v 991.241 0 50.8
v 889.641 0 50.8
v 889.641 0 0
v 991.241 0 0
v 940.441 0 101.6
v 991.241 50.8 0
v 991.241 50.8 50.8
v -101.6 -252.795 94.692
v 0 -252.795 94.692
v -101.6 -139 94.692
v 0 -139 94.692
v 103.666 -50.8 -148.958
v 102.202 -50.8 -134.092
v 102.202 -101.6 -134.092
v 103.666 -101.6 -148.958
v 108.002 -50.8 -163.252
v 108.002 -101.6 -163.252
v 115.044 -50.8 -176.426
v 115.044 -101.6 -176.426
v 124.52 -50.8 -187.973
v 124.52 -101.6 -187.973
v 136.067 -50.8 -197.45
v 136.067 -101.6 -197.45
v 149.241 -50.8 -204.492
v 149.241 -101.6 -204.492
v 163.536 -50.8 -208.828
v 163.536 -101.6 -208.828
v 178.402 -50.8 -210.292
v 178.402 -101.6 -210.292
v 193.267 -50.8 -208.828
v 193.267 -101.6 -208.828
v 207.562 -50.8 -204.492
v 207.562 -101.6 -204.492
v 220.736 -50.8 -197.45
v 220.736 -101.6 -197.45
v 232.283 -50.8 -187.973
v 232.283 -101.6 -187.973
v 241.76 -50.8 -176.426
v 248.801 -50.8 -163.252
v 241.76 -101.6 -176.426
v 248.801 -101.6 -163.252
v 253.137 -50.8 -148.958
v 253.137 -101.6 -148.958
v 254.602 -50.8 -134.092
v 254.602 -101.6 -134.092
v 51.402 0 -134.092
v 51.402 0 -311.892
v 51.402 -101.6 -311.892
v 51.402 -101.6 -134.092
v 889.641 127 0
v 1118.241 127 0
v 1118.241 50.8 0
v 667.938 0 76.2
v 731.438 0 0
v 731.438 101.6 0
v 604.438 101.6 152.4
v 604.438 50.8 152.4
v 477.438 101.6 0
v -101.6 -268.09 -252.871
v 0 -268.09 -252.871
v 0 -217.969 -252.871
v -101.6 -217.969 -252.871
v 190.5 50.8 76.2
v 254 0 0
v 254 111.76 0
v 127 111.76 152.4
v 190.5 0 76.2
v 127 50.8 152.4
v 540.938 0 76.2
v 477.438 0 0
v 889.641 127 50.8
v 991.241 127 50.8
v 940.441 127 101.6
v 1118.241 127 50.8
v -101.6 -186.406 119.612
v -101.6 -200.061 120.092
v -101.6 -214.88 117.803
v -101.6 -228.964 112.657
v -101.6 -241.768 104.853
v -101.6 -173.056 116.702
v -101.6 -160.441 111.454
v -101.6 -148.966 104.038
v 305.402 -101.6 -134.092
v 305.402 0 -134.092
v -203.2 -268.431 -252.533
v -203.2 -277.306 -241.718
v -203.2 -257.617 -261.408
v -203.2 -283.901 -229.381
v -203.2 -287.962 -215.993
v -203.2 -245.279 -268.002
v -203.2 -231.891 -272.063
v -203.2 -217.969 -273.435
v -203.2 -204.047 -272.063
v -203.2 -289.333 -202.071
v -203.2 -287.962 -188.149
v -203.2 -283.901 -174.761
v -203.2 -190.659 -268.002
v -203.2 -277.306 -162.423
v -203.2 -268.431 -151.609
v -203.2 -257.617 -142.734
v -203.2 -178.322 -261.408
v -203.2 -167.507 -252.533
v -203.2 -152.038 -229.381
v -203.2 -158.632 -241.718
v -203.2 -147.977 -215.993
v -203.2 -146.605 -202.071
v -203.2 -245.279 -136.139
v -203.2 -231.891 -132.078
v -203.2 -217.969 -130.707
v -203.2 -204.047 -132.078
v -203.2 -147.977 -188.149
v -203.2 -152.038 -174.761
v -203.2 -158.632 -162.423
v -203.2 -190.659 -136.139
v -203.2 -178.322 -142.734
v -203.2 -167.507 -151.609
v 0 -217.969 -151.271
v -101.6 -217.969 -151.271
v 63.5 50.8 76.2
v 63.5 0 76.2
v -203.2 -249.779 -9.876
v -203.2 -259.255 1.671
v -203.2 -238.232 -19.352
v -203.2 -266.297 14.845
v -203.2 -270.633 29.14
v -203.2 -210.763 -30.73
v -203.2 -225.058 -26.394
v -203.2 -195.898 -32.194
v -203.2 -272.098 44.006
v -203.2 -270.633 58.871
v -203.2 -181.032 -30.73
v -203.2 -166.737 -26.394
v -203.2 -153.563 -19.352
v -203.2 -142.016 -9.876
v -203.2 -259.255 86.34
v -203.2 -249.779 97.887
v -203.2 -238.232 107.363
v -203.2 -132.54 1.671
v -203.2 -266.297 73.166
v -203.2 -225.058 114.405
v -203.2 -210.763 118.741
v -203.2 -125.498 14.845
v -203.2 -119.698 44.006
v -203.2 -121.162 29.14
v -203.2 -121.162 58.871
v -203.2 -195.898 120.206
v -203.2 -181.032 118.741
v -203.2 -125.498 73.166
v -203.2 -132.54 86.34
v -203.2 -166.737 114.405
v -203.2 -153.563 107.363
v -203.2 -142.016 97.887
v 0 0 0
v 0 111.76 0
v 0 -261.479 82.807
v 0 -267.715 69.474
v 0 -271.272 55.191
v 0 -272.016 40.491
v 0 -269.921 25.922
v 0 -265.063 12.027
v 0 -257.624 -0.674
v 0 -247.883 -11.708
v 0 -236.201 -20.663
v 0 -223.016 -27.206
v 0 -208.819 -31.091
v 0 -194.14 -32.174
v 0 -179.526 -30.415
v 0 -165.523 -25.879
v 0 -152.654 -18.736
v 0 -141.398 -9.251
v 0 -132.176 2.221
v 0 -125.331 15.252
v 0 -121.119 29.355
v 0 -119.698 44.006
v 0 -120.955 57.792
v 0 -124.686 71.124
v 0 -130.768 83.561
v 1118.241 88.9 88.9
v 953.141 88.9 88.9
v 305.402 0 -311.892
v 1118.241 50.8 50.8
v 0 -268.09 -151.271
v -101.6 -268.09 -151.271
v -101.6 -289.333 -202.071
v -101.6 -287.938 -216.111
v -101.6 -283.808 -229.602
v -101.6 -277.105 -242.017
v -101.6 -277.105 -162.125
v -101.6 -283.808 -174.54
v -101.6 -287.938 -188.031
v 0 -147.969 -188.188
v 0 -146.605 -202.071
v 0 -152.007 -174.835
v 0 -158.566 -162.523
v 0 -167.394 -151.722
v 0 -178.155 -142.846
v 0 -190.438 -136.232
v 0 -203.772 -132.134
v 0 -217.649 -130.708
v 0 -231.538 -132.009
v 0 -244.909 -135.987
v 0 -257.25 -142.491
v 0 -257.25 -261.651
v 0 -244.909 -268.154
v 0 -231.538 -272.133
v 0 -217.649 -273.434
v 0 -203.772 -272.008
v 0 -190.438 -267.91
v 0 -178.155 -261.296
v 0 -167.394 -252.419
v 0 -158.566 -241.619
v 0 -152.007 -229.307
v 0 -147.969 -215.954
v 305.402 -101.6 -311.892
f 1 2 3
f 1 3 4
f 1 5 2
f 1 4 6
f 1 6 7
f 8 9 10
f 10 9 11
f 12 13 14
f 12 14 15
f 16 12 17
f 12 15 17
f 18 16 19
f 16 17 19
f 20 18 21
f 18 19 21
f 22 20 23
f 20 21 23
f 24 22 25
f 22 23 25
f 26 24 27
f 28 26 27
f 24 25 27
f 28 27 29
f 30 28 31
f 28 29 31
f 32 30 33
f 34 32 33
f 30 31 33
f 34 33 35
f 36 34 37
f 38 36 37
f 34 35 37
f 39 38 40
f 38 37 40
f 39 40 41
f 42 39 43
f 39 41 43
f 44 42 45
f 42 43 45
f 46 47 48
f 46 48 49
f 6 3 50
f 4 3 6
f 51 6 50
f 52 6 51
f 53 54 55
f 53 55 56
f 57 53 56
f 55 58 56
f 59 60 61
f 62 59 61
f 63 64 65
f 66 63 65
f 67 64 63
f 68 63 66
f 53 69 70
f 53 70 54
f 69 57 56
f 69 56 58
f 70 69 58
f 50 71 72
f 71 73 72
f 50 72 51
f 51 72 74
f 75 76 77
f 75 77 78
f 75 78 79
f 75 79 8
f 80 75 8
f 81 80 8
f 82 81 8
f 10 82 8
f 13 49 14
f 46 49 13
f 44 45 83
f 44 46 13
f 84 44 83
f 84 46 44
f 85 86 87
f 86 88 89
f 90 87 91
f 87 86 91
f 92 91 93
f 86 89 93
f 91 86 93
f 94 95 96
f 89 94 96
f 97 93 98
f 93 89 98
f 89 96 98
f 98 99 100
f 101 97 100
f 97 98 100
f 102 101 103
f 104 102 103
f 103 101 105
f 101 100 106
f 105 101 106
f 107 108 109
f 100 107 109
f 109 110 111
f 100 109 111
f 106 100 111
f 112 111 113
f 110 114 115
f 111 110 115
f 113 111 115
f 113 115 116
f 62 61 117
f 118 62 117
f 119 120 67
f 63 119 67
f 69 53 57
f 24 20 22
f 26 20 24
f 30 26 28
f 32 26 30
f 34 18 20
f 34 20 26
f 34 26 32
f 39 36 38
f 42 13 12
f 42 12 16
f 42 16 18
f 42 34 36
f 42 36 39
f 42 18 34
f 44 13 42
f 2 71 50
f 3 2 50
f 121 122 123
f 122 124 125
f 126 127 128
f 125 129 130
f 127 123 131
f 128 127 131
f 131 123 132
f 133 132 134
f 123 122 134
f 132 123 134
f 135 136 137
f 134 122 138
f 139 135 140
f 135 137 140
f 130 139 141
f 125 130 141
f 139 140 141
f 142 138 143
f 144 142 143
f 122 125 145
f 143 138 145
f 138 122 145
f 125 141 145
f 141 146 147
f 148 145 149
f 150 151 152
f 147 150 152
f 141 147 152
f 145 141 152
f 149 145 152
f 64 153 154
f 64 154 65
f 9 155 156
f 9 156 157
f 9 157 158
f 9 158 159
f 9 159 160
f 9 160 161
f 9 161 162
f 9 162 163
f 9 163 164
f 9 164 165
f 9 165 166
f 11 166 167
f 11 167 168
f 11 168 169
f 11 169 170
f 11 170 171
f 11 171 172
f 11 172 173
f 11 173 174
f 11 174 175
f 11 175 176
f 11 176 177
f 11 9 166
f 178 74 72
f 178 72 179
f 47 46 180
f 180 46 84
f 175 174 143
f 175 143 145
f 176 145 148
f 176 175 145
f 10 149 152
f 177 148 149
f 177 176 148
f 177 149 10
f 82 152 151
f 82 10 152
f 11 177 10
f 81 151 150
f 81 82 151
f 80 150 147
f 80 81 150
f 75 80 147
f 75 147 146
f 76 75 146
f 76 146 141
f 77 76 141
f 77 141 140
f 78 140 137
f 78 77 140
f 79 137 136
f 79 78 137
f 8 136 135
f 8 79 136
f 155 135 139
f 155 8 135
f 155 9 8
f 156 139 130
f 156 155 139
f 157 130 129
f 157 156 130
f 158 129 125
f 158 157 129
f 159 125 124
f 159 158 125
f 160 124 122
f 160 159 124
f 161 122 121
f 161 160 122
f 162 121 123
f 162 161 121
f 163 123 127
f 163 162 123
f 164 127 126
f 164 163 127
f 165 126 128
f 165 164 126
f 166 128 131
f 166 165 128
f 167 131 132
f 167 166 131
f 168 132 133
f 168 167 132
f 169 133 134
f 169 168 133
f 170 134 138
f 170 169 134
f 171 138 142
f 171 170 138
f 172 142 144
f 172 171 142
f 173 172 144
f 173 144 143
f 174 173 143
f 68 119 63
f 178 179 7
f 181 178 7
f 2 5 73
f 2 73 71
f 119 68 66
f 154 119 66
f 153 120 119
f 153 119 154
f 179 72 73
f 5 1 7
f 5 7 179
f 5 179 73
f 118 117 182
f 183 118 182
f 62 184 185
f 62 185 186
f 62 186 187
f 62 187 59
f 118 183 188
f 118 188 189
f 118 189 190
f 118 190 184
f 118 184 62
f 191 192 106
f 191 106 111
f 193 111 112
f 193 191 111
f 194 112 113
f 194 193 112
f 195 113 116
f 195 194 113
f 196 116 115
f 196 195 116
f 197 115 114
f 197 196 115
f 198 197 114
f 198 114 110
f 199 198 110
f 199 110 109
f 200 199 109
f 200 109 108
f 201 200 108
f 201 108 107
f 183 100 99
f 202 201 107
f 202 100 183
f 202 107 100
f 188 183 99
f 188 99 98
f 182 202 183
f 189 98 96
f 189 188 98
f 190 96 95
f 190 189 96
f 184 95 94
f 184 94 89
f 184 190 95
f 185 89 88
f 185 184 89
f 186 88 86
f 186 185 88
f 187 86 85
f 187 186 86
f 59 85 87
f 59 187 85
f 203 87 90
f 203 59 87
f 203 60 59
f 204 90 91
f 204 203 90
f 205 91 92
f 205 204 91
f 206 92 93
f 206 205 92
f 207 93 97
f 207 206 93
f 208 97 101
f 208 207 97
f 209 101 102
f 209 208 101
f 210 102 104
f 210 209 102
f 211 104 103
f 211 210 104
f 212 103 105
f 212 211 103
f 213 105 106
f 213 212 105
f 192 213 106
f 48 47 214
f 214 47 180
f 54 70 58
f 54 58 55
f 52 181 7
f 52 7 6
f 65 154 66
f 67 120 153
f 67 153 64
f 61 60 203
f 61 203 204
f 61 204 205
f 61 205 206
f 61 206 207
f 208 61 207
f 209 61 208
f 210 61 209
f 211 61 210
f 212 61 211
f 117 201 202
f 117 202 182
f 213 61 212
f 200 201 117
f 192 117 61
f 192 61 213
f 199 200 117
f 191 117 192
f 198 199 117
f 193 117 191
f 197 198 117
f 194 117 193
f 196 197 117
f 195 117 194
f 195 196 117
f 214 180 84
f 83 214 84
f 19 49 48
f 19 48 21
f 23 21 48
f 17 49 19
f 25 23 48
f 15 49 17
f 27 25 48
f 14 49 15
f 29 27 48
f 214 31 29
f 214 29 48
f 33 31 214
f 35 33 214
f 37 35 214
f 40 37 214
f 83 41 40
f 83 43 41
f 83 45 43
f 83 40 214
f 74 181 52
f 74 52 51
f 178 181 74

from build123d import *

# Parameters (mm, degrees)
F1_DEPTH  = 111.76
F3_DEPTH  = 50.8
F5_DEPTH  = 101.6
F9_DEPTH  = 76.2
F11_DEPTH = 127
F15_R     = 76.2
F16_DEPTH = 203.2
F18_DEPTH = 101.6
F19_R     = 71.3636690174
F20_DEPTH = 203.2
F22_DEPTH = 101.6
F23_W     = 254
F23_H     = 177.8
F24_DEPTH = 101.6
F26_DEPTH = 50.8


with BuildPart() as f1:
    # F0 (on Front) → F1 (new body)
    with BuildSketch(Plane.XZ):
        Polygon((127, 152.4), (0, 0), (254, 0), align=None)
    extrude(amount=-F1_DEPTH)

    # F2 (on face) → F3 (cut)
    with BuildSketch(Plane.XZ):
        Polygon((127, 152.4), (63.5, 76.2), (190.5, 76.2), align=None)
    extrude(amount=-F3_DEPTH, mode=Mode.SUBTRACT)


with BuildPart() as f5:
    # F4 (on Front) → F5 (new body)
    with BuildSketch(Plane.XZ):
        Polygon((604.4379685921, 152.4), (477.4379685921, 0), (731.4379685921, 0), align=None)
    extrude(amount=-F5_DEPTH)

    # F8 (on 3pt) → F9 (cut, symmetric)
    with BuildSketch(Plane.YZ.offset(604.4379685921)):
        Polygon((0, 152.4), (0, 76.2), (50.8, 152.4), align=None)
    extrude(amount=F9_DEPTH, both=True, mode=Mode.SUBTRACT)


with BuildPart() as f11:
    # F10 (on Front) → F11 (new body)
    with BuildSketch(Plane.XZ):
        Polygon((889.6409869194, 50.8), (889.6409869194, 0), (991.2409869194, 0), (991.2409869194, 50.8), (940.4409869194, 101.6), align=None)
    extrude(amount=-F11_DEPTH)

    # F13 (on offset) → F14 (join, up to the next surface of F11)
    with BuildSketch(Plane.YZ.offset(1118.2409869194)):
        Polygon((50.8, 50.8), (50.8, 0), (127, 0), (127, 50.8), (88.9, 88.9), align=None)
    extrude(until=Until.NEXT, dir=(-1, 0, 0))


with BuildPart() as f16:
    # F15 (on Right) → F16 (new body)
    with BuildSketch(Plane.YZ):
        with Locations((-195.8975046873, 44.0055020154)):
            Circle(F15_R)
    extrude(amount=-F16_DEPTH)

    # F17 (on face) → F18 (cut)
    with BuildSketch(Plane.YZ):
        with BuildLine():
            Line((-200.0606060028, 120.091693847), (-200.0606060028, 94.691693847))
            Line((-200.0606060028, 94.691693847), (-138.9997898157, 94.691693847))
            ThreePointArc((-138.9997898157, 94.691693847), (-166.6310585975, 114.3611352885), (-200.0606060028, 120.091693847))
        make_face()
        with BuildLine():
            ThreePointArc((-200.0606060028, 120.091693847), (-228.964040919, 112.657116575), (-252.7952195589, 94.691693847))
            Line((-252.7952195589, 94.691693847), (-200.0606060028, 94.691693847))
            Line((-200.0606060028, 94.691693847), (-200.0606060028, 120.091693847))
        make_face()
    extrude(amount=-F18_DEPTH, mode=Mode.SUBTRACT)


with BuildPart() as f20:
    # F19 (on Right) → F20 (new body)
    with BuildSketch(Plane.YZ):
        with Locations((-217.96913445, -202.0709067583)):
            Circle(F19_R)
    extrude(amount=-F20_DEPTH)

    # F21 (on face) → F22 (cut)
    with BuildSketch(Plane.YZ):
        with BuildLine():
            Line((-217.96913445, -252.8709067583), (-217.96913445, -202.0709067583))
            Line((-217.96913445, -202.0709067583), (-217.96913445, -151.2709067583))
            Line((-217.96913445, -151.2709067583), (-268.0903201465, -151.2709067583))
            ThreePointArc((-268.0903201465, -151.2709067583), (-289.3328034673, -202.0709067583), (-268.0903201465, -252.8709067583))
            Line((-268.0903201465, -252.8709067583), (-217.96913445, -252.8709067583))
        make_face()
    extrude(amount=-F22_DEPTH, mode=Mode.SUBTRACT)


with BuildPart() as f24:
    # F23 (on Front) → F24 (new body)
    with BuildSketch(Plane.XZ):
        with Locations((178.4016042948, -222.9919228326)):
            Rectangle(F23_W, F23_H)
    extrude(amount=F24_DEPTH)

    # F25 (on face) → F26 (cut)
    with BuildSketch(Plane.XZ.offset(101.6)):
        with BuildLine():
            Line((102.2016042948, -134.0919228326), (254.6016042948, -134.0919228326))
            ThreePointArc((254.6016042948, -134.0919228326), (178.4016042948, -57.8919228326), (102.2016042948, -134.0919228326))
        make_face()
        with BuildLine():
            ThreePointArc((102.2016042948, -134.0919228326), (178.4016042948, -210.2919228326), (254.6016042948, -134.0919228326))
            Line((254.6016042948, -134.0919228326), (102.2016042948, -134.0919228326))
        make_face()
    extrude(amount=-F26_DEPTH, mode=Mode.SUBTRACT)


solid = Compound([f1.part, f5.part, f11.part, f16.part, f20.part, f24.part])
